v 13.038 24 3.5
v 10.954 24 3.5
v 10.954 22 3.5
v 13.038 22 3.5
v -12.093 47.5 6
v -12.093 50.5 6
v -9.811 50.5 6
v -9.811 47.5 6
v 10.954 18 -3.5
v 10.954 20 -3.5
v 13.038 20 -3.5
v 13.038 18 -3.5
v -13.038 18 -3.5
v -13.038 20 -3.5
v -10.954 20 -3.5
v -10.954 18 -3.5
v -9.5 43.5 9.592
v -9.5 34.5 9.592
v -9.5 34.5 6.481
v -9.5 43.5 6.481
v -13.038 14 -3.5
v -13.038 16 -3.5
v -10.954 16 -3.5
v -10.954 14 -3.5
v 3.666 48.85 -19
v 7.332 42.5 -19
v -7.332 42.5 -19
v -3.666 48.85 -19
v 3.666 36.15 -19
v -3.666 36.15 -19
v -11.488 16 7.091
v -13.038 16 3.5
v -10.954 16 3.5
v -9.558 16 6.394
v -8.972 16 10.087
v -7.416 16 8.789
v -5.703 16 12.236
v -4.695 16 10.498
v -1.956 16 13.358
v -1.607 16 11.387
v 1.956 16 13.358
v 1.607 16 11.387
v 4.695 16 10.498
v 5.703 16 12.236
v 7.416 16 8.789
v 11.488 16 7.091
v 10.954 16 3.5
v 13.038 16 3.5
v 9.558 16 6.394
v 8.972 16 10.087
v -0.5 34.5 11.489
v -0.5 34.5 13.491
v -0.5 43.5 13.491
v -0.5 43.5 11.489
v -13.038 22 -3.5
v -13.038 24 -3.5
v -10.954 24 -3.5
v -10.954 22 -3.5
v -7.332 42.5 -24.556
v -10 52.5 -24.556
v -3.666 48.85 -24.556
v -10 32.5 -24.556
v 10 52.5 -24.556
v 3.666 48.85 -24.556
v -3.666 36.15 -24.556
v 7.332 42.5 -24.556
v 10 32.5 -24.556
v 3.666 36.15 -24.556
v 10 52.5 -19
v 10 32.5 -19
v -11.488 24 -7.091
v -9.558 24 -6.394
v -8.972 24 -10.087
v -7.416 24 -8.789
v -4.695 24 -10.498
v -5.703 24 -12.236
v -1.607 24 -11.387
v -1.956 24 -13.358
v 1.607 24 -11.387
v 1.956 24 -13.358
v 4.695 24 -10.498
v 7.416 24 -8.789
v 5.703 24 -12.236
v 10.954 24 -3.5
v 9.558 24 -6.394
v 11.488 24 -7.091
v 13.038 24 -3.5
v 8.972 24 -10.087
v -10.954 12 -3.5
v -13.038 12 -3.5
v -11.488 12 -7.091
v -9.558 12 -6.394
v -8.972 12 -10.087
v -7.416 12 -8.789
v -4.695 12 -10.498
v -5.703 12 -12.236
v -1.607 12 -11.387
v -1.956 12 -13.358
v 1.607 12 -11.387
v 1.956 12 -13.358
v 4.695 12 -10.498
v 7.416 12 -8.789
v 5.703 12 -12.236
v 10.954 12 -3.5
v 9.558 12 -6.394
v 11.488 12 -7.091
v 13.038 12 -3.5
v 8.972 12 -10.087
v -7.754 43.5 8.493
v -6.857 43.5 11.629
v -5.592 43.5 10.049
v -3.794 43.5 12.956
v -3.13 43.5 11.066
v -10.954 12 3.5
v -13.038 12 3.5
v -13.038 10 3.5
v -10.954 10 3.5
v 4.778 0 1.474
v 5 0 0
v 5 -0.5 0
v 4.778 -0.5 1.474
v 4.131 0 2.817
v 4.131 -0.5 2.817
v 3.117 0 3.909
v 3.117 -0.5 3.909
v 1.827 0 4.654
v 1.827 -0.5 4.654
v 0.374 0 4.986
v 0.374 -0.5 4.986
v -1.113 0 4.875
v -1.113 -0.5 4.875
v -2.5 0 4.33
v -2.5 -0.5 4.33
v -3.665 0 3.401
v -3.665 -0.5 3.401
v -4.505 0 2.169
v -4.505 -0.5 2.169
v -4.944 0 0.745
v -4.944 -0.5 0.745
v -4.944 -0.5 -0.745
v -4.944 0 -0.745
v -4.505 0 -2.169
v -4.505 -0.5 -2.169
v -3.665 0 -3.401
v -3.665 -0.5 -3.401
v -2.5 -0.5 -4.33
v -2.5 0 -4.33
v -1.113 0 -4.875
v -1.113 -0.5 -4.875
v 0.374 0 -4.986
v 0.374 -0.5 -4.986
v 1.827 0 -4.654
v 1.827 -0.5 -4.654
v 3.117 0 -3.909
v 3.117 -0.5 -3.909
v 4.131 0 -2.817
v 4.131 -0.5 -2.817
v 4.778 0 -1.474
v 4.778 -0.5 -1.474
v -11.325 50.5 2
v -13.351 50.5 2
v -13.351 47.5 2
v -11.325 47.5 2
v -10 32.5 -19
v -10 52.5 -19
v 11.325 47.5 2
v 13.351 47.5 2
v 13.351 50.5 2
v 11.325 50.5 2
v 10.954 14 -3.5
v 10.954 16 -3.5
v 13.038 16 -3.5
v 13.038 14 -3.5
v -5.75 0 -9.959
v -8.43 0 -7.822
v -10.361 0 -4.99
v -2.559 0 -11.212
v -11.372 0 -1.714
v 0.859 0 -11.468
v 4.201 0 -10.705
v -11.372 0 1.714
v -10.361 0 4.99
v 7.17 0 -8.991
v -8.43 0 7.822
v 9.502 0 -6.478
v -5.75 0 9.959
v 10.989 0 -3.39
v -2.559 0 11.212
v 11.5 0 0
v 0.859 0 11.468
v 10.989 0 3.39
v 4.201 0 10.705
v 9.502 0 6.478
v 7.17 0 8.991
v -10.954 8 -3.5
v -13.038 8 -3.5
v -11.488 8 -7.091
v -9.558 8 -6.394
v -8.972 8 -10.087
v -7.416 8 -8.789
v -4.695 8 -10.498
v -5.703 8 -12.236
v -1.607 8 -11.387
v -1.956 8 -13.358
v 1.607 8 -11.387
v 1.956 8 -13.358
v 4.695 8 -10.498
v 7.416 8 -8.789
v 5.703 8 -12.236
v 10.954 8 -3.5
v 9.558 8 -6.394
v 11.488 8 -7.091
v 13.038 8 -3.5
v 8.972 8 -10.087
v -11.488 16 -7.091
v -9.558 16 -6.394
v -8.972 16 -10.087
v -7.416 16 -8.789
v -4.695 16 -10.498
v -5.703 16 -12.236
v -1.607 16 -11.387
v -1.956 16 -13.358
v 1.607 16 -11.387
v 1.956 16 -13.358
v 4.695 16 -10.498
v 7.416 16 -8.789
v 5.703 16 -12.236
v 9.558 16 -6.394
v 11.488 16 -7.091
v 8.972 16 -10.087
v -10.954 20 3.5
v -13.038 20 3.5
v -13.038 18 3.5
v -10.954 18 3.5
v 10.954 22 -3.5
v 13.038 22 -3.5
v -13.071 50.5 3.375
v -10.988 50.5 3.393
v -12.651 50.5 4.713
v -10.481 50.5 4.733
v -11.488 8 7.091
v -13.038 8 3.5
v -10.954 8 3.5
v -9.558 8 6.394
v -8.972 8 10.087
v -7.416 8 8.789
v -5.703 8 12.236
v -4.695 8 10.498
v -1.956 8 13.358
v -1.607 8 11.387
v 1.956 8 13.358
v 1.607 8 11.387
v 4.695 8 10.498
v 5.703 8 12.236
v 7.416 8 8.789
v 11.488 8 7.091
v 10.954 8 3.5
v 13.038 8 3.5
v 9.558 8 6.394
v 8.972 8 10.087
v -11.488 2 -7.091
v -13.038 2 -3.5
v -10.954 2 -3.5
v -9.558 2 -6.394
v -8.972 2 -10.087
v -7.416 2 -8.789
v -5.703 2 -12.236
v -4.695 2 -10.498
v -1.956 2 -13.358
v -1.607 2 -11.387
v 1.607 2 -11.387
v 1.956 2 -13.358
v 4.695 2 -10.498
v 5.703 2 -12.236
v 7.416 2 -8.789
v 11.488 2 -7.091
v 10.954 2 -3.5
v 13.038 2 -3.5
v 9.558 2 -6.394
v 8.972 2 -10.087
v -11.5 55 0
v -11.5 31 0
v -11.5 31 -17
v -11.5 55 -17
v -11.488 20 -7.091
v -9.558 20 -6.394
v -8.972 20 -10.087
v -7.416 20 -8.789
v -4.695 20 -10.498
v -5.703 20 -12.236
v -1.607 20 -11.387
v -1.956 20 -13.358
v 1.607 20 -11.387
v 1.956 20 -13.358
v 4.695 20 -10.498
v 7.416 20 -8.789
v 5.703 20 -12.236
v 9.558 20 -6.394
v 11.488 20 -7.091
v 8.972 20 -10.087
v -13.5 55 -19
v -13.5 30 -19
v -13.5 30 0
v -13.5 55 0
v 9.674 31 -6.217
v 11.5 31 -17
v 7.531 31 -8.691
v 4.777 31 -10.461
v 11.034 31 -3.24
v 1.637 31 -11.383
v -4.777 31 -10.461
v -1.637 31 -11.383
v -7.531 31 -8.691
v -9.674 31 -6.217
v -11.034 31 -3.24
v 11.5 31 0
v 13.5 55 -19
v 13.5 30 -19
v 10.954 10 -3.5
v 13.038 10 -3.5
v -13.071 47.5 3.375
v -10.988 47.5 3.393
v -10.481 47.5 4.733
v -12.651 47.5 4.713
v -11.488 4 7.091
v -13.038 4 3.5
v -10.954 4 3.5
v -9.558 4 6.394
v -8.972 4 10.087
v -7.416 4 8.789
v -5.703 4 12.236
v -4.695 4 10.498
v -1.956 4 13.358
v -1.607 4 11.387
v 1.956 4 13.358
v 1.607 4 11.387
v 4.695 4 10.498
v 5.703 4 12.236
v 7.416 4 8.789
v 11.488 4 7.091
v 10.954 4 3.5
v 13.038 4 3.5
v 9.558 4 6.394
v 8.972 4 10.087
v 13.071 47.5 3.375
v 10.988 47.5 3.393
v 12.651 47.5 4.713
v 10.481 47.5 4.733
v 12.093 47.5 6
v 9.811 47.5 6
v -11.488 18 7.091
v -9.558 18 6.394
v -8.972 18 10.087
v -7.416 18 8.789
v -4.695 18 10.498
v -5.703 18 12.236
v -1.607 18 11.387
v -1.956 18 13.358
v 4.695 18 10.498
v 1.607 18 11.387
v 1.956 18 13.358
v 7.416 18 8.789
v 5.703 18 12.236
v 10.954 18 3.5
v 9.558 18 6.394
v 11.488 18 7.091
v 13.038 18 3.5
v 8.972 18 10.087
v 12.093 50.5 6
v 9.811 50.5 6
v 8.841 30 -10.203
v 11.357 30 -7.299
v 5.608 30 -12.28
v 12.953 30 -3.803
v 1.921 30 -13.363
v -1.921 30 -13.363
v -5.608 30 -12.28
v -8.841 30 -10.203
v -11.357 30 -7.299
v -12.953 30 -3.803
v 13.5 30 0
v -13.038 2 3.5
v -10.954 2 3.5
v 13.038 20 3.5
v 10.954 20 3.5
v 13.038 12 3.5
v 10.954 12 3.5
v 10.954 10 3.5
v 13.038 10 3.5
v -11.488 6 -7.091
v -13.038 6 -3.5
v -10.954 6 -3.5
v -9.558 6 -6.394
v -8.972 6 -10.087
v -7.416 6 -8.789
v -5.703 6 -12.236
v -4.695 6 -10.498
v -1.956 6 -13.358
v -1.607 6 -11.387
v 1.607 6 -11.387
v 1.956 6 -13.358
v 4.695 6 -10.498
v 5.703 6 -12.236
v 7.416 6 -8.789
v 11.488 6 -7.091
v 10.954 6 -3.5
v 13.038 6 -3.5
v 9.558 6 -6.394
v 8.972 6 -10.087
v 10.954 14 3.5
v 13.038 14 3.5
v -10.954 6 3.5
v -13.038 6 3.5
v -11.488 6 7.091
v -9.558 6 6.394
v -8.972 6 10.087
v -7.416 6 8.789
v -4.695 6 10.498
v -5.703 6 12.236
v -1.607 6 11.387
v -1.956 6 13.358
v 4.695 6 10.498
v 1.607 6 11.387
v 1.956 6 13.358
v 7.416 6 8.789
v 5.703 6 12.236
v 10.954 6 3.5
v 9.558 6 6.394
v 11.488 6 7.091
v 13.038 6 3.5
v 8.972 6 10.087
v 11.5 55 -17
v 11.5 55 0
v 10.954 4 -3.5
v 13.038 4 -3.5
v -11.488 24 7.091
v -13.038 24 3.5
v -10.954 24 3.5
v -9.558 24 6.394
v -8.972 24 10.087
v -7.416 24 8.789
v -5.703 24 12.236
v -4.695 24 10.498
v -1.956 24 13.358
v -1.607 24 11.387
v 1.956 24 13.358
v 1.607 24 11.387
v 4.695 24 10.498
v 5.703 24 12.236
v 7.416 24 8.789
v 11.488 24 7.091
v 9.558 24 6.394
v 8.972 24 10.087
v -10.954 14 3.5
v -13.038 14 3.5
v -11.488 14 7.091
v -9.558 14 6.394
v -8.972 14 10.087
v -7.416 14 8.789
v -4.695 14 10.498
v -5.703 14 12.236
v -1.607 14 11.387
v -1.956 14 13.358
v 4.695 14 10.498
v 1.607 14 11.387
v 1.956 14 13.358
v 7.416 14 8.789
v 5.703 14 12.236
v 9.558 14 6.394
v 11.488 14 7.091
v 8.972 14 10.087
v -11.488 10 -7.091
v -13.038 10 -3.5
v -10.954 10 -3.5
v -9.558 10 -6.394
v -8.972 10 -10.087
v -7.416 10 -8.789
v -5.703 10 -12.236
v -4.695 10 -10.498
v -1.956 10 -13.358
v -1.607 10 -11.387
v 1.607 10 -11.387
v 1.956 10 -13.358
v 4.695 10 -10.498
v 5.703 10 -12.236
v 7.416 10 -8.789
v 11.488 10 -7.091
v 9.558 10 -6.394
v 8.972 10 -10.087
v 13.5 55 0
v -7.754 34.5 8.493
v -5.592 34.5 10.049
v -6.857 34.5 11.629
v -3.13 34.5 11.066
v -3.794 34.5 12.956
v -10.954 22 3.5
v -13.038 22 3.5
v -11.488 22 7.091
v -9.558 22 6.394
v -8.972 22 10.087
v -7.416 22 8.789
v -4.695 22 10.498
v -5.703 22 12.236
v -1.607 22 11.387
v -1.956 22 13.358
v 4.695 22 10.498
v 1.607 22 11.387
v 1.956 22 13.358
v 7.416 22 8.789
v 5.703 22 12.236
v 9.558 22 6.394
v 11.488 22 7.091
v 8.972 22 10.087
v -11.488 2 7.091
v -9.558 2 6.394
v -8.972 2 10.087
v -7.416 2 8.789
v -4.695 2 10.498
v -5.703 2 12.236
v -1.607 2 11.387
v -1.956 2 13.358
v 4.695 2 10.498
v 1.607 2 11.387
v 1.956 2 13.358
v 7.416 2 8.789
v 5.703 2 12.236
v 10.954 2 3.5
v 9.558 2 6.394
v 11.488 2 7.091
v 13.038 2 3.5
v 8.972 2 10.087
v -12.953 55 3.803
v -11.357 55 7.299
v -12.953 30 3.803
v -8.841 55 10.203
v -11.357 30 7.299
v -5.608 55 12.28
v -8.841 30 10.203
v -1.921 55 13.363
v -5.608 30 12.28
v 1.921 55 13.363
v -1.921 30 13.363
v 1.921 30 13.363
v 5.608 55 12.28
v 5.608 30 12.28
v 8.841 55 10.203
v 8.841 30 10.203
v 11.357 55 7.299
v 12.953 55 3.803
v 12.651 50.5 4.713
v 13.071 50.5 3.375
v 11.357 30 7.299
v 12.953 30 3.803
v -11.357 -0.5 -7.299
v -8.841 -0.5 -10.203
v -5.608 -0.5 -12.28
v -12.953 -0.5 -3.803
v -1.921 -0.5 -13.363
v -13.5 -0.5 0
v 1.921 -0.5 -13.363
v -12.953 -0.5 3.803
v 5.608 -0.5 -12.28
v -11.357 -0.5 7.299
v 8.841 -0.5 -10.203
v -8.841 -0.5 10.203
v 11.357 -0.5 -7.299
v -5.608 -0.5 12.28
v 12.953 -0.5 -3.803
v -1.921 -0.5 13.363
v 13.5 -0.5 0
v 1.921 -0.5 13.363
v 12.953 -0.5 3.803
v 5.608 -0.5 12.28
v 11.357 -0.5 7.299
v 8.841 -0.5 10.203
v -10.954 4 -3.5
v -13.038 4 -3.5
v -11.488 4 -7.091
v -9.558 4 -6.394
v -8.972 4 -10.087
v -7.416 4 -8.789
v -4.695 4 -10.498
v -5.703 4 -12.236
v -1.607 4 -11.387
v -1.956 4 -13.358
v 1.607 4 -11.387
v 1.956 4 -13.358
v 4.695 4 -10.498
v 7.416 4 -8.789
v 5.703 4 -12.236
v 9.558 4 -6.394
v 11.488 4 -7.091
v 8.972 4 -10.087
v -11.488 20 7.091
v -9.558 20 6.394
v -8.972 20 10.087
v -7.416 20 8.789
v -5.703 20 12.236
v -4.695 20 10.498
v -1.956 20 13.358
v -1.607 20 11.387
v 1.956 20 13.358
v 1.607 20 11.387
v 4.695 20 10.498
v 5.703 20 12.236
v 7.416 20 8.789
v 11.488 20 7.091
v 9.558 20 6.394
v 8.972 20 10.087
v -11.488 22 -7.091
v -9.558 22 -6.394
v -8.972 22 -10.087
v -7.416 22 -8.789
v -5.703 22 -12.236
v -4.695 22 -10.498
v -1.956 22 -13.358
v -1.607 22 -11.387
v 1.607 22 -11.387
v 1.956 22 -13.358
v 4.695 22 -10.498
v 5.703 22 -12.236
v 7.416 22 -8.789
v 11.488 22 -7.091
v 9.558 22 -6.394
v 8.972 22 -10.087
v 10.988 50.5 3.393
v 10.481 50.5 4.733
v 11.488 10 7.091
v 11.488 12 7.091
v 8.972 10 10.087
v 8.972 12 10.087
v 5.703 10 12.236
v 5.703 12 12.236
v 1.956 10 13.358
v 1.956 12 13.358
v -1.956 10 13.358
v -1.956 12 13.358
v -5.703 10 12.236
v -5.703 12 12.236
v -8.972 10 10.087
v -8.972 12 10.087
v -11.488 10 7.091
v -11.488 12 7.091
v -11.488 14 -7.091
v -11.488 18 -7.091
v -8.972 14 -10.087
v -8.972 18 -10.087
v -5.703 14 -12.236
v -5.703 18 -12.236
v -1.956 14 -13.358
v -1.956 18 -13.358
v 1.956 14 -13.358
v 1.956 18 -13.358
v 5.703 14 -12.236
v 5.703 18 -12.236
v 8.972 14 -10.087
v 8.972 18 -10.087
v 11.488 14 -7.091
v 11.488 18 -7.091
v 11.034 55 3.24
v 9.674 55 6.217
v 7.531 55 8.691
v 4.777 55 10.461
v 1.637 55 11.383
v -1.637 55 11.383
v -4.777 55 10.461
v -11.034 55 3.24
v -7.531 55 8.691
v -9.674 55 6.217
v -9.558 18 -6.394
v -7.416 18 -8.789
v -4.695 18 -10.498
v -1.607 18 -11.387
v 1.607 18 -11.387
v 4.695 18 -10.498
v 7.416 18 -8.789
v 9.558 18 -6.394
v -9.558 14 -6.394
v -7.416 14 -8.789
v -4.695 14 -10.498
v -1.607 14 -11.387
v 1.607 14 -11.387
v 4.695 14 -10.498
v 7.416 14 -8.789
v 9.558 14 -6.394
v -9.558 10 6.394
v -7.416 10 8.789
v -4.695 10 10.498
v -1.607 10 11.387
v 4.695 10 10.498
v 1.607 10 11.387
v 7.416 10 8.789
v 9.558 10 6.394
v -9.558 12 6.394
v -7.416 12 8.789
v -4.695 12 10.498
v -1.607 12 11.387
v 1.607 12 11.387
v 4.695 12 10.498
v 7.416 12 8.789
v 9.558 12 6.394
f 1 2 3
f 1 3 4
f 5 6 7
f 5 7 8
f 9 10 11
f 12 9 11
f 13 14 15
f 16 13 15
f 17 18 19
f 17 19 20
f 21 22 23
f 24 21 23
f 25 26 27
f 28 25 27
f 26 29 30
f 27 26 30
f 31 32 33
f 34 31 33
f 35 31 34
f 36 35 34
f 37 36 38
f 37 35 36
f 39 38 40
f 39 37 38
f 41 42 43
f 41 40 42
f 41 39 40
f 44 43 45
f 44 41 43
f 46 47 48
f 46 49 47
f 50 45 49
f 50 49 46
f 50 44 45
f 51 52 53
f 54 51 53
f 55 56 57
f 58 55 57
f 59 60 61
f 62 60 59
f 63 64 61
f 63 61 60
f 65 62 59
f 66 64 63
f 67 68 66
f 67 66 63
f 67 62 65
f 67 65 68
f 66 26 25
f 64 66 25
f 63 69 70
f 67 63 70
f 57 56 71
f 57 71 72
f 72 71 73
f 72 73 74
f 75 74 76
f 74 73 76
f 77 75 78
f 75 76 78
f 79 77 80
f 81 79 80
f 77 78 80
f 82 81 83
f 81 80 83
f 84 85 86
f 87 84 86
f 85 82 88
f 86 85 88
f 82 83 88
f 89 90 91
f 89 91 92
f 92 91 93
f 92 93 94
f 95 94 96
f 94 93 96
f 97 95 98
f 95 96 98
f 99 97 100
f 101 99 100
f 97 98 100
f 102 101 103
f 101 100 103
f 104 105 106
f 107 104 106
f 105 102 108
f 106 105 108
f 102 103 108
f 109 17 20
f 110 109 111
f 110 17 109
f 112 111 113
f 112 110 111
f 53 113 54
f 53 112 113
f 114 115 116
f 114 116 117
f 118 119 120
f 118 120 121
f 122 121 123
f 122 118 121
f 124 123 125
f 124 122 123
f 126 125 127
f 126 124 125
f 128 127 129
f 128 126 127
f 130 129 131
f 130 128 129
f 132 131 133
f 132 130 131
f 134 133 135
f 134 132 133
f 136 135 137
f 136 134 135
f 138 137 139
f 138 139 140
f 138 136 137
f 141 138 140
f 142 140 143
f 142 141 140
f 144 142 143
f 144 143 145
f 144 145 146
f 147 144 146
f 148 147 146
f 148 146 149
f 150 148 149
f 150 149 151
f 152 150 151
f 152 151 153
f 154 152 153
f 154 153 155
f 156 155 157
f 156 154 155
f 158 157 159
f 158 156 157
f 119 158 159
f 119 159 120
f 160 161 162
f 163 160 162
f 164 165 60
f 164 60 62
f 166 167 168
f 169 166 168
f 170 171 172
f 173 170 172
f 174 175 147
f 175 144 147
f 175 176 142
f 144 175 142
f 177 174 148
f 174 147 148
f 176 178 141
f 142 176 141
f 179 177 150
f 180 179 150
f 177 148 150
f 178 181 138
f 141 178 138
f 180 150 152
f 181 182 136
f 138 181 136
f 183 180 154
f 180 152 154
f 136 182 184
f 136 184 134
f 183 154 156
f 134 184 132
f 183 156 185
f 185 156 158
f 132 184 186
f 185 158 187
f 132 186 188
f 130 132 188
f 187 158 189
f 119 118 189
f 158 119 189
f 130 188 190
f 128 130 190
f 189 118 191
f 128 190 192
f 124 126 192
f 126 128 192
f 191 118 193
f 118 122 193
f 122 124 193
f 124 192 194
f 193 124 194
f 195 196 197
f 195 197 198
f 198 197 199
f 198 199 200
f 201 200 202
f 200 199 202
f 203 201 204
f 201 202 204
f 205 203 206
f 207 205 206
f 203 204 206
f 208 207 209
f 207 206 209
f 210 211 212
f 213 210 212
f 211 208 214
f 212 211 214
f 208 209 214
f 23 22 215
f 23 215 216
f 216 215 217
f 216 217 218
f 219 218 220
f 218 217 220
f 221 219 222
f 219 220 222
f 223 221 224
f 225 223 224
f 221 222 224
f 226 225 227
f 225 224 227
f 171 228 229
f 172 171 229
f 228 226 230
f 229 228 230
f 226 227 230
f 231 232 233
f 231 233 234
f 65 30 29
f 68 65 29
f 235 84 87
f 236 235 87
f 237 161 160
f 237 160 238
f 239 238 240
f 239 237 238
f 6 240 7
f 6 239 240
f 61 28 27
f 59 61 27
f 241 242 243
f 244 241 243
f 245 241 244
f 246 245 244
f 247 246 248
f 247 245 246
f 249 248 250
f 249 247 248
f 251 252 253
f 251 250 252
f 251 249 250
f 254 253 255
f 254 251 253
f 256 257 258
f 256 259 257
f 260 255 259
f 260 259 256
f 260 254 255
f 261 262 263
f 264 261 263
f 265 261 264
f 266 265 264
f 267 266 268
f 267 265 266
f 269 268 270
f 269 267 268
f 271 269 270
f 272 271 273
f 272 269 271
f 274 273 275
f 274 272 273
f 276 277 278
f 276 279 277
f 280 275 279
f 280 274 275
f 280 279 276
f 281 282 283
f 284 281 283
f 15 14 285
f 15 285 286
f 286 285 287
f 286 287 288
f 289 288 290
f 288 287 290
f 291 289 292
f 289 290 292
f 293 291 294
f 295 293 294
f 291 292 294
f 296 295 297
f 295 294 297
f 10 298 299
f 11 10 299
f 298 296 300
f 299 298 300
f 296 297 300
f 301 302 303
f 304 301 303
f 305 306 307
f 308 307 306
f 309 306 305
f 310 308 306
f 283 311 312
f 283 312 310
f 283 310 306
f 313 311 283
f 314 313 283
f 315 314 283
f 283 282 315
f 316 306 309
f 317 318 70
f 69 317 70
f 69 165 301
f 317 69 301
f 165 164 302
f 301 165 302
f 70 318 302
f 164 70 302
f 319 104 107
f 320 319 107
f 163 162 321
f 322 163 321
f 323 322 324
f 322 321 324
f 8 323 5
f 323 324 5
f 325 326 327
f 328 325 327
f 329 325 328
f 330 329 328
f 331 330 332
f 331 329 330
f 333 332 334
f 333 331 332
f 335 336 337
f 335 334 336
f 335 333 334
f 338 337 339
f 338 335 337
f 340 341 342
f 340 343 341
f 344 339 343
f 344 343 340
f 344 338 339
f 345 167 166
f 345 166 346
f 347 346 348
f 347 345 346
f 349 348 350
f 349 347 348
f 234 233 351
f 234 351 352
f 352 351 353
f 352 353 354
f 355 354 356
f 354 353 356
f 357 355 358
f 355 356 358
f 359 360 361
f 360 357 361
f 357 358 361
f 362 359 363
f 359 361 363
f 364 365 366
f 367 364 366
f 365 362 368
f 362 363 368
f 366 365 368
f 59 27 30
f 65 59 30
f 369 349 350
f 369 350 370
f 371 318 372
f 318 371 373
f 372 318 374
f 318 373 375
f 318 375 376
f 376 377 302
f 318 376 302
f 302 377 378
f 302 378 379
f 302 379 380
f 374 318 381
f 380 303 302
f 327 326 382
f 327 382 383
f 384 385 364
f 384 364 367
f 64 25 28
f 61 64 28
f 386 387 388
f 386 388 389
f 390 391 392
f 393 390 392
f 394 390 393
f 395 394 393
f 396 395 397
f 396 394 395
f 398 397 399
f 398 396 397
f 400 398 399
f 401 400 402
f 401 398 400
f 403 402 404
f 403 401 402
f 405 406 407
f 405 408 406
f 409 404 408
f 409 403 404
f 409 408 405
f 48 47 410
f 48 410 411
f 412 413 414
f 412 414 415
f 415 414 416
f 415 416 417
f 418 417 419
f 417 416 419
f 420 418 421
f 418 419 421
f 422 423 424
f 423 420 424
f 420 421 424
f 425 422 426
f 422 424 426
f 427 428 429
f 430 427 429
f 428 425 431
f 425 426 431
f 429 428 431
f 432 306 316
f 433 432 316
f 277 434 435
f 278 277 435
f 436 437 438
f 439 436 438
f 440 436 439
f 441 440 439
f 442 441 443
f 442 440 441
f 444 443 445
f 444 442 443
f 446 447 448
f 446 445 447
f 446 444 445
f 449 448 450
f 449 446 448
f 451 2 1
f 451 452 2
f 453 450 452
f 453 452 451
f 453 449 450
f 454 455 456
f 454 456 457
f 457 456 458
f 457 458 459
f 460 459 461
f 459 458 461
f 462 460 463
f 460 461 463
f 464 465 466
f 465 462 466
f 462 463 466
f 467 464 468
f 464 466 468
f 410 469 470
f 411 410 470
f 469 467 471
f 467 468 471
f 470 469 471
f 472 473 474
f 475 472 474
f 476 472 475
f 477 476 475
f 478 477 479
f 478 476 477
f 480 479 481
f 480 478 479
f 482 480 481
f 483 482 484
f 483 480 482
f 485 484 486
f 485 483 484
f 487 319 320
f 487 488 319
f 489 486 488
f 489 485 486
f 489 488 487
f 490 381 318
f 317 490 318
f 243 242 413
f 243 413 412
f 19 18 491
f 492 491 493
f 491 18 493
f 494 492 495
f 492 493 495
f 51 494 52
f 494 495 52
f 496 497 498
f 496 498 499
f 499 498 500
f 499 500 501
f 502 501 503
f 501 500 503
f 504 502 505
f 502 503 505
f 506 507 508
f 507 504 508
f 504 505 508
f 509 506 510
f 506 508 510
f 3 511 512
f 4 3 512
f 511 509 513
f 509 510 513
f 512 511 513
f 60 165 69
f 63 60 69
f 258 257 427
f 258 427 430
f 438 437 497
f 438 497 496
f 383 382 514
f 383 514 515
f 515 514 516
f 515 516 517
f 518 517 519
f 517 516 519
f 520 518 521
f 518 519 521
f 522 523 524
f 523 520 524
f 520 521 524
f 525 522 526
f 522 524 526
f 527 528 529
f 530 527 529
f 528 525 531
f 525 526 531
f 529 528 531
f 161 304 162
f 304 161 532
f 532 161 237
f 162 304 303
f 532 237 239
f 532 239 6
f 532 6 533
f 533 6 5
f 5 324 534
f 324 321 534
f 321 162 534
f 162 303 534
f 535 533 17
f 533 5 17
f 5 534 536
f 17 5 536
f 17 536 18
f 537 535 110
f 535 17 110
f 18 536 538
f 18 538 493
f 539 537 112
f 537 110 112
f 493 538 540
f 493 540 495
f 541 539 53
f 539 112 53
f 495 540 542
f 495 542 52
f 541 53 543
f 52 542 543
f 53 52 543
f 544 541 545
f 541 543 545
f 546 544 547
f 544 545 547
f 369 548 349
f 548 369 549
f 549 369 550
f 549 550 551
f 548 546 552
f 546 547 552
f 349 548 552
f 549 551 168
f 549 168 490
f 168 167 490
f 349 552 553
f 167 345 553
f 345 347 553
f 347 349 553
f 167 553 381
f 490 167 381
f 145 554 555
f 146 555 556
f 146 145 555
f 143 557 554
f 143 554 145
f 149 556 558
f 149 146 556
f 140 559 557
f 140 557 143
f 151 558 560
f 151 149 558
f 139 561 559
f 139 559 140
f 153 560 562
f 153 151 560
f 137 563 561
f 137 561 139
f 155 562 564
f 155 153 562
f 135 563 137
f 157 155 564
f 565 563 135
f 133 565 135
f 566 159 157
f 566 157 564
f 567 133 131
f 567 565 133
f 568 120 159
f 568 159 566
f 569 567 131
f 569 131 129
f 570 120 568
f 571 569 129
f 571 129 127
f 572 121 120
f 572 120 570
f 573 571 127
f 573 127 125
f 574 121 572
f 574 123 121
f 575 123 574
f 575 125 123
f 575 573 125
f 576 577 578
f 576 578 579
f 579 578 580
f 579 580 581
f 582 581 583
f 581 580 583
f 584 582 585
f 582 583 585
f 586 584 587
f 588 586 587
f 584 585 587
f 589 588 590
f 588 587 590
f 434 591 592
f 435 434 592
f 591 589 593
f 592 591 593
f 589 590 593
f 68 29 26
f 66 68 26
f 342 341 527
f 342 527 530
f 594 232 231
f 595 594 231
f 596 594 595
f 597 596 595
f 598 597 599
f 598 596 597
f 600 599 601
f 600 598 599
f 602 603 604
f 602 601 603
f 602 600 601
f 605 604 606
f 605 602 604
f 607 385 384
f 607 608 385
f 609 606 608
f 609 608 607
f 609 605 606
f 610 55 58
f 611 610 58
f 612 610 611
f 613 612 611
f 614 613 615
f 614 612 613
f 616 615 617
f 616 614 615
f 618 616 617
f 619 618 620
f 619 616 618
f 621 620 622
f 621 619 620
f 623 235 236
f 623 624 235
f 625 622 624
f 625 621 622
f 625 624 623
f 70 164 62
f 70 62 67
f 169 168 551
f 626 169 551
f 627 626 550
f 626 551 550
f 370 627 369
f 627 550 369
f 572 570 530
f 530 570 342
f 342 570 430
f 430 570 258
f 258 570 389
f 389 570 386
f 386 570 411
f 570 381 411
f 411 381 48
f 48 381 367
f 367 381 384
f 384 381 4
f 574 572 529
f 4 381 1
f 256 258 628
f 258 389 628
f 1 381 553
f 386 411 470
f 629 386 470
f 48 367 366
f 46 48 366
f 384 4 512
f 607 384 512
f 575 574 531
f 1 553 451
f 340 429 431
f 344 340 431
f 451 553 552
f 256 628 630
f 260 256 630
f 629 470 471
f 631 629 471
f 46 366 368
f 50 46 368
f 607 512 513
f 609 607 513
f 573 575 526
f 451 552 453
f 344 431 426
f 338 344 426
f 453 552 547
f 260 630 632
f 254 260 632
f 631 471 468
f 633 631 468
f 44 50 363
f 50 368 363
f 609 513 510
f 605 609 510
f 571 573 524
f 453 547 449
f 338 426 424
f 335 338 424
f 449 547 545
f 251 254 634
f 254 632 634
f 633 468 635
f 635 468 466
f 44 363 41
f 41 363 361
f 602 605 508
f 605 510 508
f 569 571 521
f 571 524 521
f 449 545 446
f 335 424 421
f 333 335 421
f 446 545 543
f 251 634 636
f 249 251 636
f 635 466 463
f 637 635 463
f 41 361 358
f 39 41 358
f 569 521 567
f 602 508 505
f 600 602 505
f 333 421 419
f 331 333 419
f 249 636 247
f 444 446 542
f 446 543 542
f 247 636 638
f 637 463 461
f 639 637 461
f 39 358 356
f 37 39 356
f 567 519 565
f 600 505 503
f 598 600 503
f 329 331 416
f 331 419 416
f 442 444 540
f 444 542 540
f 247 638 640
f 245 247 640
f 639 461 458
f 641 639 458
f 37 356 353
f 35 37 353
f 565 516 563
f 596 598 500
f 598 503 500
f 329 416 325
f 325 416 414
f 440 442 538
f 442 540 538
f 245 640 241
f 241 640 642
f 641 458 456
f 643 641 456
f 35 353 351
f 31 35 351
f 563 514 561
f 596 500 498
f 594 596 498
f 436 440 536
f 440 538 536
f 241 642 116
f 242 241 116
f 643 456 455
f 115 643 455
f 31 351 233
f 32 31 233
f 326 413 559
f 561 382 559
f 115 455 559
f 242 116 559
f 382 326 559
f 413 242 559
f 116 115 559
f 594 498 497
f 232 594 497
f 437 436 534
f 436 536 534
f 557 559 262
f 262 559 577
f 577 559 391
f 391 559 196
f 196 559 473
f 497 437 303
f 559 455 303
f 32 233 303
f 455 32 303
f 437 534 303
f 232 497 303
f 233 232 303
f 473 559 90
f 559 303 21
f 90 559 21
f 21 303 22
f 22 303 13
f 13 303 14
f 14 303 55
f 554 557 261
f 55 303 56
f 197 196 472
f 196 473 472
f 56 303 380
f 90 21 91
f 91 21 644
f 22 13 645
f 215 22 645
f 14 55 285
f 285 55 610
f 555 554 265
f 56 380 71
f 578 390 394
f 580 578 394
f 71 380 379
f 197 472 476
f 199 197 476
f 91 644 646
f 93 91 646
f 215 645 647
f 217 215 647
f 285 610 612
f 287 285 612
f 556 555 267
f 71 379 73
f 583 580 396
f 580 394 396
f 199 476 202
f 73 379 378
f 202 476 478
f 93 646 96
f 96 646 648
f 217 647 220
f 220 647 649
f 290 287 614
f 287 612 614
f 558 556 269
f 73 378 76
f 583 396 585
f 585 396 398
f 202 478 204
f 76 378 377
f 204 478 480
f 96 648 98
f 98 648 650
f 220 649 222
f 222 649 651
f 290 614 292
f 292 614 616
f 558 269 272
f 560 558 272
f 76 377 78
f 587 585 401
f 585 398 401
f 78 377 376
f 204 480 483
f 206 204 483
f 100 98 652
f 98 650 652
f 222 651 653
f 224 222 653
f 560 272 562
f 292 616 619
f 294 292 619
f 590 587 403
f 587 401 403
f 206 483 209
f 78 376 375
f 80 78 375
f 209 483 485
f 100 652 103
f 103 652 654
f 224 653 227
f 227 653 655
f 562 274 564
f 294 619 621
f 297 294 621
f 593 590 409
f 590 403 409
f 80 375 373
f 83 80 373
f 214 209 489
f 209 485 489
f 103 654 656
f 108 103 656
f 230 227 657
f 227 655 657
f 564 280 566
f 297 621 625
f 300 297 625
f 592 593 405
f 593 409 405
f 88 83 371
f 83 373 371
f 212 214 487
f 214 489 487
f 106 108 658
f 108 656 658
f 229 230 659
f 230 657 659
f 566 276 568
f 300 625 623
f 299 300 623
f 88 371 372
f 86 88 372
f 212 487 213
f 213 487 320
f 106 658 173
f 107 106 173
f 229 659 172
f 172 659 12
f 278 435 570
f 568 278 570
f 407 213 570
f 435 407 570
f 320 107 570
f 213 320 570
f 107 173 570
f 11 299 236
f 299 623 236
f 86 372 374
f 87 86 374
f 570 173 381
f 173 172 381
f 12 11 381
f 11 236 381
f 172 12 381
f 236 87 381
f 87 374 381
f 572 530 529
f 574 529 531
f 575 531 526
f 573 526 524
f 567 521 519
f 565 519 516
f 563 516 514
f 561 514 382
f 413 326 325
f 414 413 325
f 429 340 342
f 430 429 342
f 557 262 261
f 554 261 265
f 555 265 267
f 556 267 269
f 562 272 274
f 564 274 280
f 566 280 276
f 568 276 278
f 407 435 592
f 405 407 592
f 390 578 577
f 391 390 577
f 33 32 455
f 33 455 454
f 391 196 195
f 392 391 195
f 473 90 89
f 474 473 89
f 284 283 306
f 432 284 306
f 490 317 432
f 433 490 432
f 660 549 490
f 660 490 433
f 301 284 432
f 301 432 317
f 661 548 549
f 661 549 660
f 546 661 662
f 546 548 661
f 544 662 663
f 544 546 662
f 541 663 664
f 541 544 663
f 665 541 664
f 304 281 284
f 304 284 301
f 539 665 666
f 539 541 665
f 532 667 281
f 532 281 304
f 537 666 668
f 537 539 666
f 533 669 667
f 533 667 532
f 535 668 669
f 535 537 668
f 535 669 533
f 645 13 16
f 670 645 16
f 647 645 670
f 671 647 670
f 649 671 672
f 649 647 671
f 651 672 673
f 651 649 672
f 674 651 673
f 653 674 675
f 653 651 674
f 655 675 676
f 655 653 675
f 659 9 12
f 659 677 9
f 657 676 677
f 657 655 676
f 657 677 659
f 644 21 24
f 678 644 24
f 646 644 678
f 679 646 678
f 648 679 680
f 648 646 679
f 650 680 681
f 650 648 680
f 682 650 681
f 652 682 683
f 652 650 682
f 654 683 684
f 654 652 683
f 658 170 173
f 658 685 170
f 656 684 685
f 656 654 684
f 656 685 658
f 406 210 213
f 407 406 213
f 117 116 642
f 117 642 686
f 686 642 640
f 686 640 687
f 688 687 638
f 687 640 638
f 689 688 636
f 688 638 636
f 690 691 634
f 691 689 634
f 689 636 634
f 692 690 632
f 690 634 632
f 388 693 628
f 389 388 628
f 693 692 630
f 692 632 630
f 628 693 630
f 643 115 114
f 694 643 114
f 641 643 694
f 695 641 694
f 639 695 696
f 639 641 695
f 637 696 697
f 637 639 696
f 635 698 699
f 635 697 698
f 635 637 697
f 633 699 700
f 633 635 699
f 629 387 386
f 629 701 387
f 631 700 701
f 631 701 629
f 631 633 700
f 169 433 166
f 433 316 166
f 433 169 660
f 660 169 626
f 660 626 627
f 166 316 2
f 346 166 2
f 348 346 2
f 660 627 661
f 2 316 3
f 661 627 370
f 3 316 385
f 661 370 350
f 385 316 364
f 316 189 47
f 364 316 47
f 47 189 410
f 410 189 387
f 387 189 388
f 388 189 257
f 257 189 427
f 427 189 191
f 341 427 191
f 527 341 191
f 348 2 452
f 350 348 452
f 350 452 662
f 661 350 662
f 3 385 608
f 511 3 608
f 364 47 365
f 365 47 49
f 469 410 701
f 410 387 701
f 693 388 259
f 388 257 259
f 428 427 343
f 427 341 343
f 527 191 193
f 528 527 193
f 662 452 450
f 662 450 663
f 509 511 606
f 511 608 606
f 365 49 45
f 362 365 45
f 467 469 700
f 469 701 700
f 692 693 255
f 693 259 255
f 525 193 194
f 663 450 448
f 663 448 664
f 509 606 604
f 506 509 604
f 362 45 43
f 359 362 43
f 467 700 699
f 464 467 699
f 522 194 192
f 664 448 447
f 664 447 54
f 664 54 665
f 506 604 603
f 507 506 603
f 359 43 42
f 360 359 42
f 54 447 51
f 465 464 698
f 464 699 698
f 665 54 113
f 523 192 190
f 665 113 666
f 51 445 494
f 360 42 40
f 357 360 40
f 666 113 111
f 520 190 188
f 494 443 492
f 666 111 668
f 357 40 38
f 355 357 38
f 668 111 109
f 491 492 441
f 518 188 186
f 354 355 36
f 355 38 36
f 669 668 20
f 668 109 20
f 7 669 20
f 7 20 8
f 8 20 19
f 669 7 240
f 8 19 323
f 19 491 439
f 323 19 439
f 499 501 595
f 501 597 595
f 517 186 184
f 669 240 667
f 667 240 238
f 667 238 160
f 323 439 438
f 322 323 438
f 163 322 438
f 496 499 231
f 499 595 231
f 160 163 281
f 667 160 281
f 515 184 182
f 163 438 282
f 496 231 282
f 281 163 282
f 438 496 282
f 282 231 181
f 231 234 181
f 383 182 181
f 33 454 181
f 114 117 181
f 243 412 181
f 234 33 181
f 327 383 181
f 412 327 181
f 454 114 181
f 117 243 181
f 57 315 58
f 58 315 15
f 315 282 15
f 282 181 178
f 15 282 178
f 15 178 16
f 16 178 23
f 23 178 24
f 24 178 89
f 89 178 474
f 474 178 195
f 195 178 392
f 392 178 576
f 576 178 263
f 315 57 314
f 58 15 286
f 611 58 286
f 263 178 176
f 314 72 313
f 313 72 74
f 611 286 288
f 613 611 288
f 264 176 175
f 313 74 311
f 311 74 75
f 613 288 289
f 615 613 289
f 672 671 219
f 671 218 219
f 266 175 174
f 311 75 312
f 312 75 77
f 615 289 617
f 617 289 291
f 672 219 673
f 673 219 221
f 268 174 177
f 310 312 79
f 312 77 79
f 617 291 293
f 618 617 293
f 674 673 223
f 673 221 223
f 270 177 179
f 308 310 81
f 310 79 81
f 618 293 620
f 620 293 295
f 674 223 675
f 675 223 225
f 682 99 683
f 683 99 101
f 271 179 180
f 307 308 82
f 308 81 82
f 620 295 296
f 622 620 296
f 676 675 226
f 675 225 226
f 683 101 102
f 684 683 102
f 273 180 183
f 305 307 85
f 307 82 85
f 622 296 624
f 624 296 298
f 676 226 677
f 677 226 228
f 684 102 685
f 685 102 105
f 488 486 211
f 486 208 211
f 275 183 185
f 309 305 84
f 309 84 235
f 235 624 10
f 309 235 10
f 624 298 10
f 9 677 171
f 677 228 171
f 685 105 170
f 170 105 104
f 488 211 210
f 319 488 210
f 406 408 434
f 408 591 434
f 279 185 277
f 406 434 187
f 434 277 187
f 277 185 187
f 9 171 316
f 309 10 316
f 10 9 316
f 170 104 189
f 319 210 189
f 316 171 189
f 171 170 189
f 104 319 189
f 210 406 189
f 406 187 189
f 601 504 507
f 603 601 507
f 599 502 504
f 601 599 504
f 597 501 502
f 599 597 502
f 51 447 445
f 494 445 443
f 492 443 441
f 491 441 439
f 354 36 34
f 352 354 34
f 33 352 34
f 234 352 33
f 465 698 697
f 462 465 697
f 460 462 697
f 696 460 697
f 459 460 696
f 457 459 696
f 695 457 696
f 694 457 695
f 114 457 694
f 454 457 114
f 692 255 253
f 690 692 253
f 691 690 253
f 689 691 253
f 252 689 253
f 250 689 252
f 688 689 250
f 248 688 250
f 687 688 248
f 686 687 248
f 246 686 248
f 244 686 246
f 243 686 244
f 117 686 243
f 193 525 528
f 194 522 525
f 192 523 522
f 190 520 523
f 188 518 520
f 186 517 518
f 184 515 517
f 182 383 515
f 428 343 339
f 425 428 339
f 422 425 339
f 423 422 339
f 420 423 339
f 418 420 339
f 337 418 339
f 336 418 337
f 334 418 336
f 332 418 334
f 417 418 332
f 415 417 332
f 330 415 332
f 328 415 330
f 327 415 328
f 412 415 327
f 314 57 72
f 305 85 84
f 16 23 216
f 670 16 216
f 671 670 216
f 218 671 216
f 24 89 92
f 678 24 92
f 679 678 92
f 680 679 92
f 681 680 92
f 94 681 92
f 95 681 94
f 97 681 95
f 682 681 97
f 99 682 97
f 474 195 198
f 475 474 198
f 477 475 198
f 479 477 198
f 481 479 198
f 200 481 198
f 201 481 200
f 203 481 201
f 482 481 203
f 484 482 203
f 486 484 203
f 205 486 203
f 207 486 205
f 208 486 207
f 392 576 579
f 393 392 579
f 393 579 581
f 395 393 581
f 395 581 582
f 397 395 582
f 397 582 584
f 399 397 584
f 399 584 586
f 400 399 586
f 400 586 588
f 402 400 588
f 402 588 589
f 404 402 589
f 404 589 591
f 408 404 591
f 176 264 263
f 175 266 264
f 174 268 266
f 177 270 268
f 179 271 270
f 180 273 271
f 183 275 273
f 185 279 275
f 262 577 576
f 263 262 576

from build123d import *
from build123d import SkipClean  # not in build123d's __all__

# Parameters (mm, degrees)
F0_R      = 13.5
F0_R_2    = 11.5
F1_DEPTH  = 30
F2_R      = 13.5
F2_R_2    = 5
F3_DEPTH  = 0.5
F5_W      = 27
F5_H      = 2
F6_DEPTH  = 10
F8_W      = 27
F8_H      = 2
F9_DEPTH  = 10
F11_DEPTH = 25
F13_DEPTH = 1
F14_W     = 20
F14_H     = 20
F15_DEPTH = 5.55625
F16_W     = 3
F16_H     = 4
F17_DEPTH = 4
F18_W     = 3
F18_H     = 4
F19_DEPTH = 4
F20_W     = 9
F20_H     = 9
F21_DEPTH = 8


# Not quite as in the source:
# - after a boolean that leaves OpenCascade's solid faulty, fix() repairs it
# - a length typed as a fraction of an inch, garbled in the dataset ("3 / 203.2 mm" for 3/8 in), is restored


with BuildPart() as f1:
    # F0 (on Front) → F1 (new body)
    with BuildSketch(Plane.XZ):
        Circle(F0_R)
        Circle(F0_R_2, mode=Mode.SUBTRACT)
    extrude(amount=-F1_DEPTH)

    # F2 (on Front) → F3 (join)
    with BuildSketch(Plane.XZ):
        Circle(F2_R)
        Circle(F2_R_2, mode=Mode.SUBTRACT)
    extrude(amount=F3_DEPTH)

    # F5 (on offset) → F6 (cut)
    with BuildSketch(Plane.XY.offset(13.5)):
        with Locations((0, 2.9999998671)):
            Rectangle(F5_W, F5_H)
        with Locations((0, 22.9999998671)):
            Rectangle(F5_W, F5_H)
        with Locations((0, 6.9999998671)):
            Rectangle(F5_W, F5_H)
        with Locations((0, 10.9999998671)):
            Rectangle(F5_W, F5_H)
        with Locations((0, 14.9999998671)):
            Rectangle(F5_W, F5_H)
        with Locations((0, 18.9999998671)):
            Rectangle(F5_W, F5_H)
    extrude(amount=-F6_DEPTH, mode=Mode.SUBTRACT)

    # F8 (on offset) → F9 (cut)
    with BuildSketch(Plane.XY.offset(-13.5)):
        with Locations((5.811e-07, 3.000000095)):
            Rectangle(F8_W, F8_H)
        with Locations((5.811e-07, 7.000000095)):
            Rectangle(F8_W, F8_H)
        with Locations((5.811e-07, 11.000000095)):
            Rectangle(F8_W, F8_H)
        with Locations((5.811e-07, 15.000000095)):
            Rectangle(F8_W, F8_H)
        with Locations((5.811e-07, 19.000000095)):
            Rectangle(F8_W, F8_H)
        with Locations((5.811e-07, 23.000000095)):
            Rectangle(F8_W, F8_H)
    extrude(amount=F9_DEPTH, mode=Mode.SUBTRACT)

    # F10 (on face) → F11 (join)
    with BuildSketch(Plane(origin=(0, 30, 0), x_dir=(-1, 0, 0), z_dir=(0, 1, 0))):
        with BuildLine():
            Line((11.5, 0), (11.5, -7.0710678119))
            ThreePointArc((11.5, -7.0710678119), (12.9903810568, -3.6742346142), (13.5, 0))
            ThreePointArc((13.5, 0), (0, 13.5), (-13.5, 0))
            ThreePointArc((-13.5, 0), (-12.9903810568, -3.6742346142), (-11.5, -7.0710678119))
            Line((-11.5, -7.0710678119), (-11.5, 0))
            ThreePointArc((-11.5, 0), (0, 11.5), (11.5, 0))
        make_face()
        with BuildLine():
            ThreePointArc((13.5, 0), (12.9903810568, -3.6742346142), (11.5, -7.0710678119))
            Line((11.5, -7.0710678119), (11.5, -17))
            Line((11.5, -17), (-11.5, -17))
            Line((-11.5, -17), (-11.5, -7.0710678119))
            ThreePointArc((-11.5, -7.0710678119), (-12.9903810568, -3.6742346142), (-13.5, 0))
            Line((-13.5, 0), (-13.5, -19))
            Line((-13.5, -19), (13.5, -19))
            Line((13.5, -19), (13.5, 0))
        make_face()
    with SkipClean():  # cleaning this boolean's faces spoils the solid; the shape is the same uncleaned
        extrude(amount=F11_DEPTH)

    # F12 (on face) → F13 (join)
    with BuildSketch(Plane(origin=(0, 30, 0), x_dir=(-1, 0, 0), z_dir=(0, 1, 0))):
        with BuildLine():
            Line((13.5, -19), (13.5, 0))
            ThreePointArc((13.5, 0), (12.9903810568, -3.6742346142), (11.5, -7.0710678119))
            ThreePointArc((11.5, -7.0710678119), (0, -13.5), (-11.5, -7.0710678119))
            ThreePointArc((-11.5, -7.0710678119), (-12.9903810568, -3.6742346142), (-13.5, 0))
            Line((-13.5, 0), (-13.5, -19))
            Line((-13.5, -19), (13.5, -19))
        make_face()
        with BuildLine():
            ThreePointArc((-11.5, -7.0710678119), (0, -13.5), (11.5, -7.0710678119))
            Line((11.5, -7.0710678119), (11.5, 0))
            ThreePointArc((11.5, 0), (0, -11.5), (-11.5, 0))
            Line((-11.5, 0), (-11.5, -7.0710678119))
        make_face()
    with SkipClean():  # cleaning this boolean's faces spoils the solid; the shape is the same uncleaned
        extrude(amount=F13_DEPTH)

    # F14 (on face) → F15 (join)
    with BuildSketch(Plane(origin=(0, 0, -19), x_dir=(1, 0, 0), z_dir=(0, 0, -1))):
        with Locations((0, -42.5)):
            Rectangle(F14_W, F14_H)
        Polygon((-3.6661742094, -36.15), (3.6661742094, -36.15), (7.3323484187, -42.5), (3.6661742094, -48.85), (-3.6661742094, -48.85), (-7.3323484187, -42.5), align=None, mode=Mode.SUBTRACT)
    extrude(amount=F15_DEPTH)

    add(f1.part.fix(), mode=Mode.REPLACE)

    # F16 (on face) → F17 (cut)
    with BuildSketch(Plane.YZ.offset(13.5)):
        with Locations((49, 4)):
            Rectangle(F16_W, F16_H)
    extrude(amount=-F17_DEPTH, mode=Mode.SUBTRACT)

    # F18 (on face) → F19 (cut)
    with BuildSketch(Plane(origin=(-13.5, 0, 0), x_dir=(0, -1, 0), z_dir=(-1, 0, 0))):
        with Locations((-49, 4)):
            Rectangle(F18_W, F18_H)
    extrude(amount=-F19_DEPTH, mode=Mode.SUBTRACT)

    # F20 (on offset) → F21 (cut)
    with BuildSketch(Plane.XY.offset(13.5)):
        with Locations((-5, 39)):
            Rectangle(F20_W, F20_H)
    extrude(amount=-F21_DEPTH, mode=Mode.SUBTRACT)


solid = f1.part
